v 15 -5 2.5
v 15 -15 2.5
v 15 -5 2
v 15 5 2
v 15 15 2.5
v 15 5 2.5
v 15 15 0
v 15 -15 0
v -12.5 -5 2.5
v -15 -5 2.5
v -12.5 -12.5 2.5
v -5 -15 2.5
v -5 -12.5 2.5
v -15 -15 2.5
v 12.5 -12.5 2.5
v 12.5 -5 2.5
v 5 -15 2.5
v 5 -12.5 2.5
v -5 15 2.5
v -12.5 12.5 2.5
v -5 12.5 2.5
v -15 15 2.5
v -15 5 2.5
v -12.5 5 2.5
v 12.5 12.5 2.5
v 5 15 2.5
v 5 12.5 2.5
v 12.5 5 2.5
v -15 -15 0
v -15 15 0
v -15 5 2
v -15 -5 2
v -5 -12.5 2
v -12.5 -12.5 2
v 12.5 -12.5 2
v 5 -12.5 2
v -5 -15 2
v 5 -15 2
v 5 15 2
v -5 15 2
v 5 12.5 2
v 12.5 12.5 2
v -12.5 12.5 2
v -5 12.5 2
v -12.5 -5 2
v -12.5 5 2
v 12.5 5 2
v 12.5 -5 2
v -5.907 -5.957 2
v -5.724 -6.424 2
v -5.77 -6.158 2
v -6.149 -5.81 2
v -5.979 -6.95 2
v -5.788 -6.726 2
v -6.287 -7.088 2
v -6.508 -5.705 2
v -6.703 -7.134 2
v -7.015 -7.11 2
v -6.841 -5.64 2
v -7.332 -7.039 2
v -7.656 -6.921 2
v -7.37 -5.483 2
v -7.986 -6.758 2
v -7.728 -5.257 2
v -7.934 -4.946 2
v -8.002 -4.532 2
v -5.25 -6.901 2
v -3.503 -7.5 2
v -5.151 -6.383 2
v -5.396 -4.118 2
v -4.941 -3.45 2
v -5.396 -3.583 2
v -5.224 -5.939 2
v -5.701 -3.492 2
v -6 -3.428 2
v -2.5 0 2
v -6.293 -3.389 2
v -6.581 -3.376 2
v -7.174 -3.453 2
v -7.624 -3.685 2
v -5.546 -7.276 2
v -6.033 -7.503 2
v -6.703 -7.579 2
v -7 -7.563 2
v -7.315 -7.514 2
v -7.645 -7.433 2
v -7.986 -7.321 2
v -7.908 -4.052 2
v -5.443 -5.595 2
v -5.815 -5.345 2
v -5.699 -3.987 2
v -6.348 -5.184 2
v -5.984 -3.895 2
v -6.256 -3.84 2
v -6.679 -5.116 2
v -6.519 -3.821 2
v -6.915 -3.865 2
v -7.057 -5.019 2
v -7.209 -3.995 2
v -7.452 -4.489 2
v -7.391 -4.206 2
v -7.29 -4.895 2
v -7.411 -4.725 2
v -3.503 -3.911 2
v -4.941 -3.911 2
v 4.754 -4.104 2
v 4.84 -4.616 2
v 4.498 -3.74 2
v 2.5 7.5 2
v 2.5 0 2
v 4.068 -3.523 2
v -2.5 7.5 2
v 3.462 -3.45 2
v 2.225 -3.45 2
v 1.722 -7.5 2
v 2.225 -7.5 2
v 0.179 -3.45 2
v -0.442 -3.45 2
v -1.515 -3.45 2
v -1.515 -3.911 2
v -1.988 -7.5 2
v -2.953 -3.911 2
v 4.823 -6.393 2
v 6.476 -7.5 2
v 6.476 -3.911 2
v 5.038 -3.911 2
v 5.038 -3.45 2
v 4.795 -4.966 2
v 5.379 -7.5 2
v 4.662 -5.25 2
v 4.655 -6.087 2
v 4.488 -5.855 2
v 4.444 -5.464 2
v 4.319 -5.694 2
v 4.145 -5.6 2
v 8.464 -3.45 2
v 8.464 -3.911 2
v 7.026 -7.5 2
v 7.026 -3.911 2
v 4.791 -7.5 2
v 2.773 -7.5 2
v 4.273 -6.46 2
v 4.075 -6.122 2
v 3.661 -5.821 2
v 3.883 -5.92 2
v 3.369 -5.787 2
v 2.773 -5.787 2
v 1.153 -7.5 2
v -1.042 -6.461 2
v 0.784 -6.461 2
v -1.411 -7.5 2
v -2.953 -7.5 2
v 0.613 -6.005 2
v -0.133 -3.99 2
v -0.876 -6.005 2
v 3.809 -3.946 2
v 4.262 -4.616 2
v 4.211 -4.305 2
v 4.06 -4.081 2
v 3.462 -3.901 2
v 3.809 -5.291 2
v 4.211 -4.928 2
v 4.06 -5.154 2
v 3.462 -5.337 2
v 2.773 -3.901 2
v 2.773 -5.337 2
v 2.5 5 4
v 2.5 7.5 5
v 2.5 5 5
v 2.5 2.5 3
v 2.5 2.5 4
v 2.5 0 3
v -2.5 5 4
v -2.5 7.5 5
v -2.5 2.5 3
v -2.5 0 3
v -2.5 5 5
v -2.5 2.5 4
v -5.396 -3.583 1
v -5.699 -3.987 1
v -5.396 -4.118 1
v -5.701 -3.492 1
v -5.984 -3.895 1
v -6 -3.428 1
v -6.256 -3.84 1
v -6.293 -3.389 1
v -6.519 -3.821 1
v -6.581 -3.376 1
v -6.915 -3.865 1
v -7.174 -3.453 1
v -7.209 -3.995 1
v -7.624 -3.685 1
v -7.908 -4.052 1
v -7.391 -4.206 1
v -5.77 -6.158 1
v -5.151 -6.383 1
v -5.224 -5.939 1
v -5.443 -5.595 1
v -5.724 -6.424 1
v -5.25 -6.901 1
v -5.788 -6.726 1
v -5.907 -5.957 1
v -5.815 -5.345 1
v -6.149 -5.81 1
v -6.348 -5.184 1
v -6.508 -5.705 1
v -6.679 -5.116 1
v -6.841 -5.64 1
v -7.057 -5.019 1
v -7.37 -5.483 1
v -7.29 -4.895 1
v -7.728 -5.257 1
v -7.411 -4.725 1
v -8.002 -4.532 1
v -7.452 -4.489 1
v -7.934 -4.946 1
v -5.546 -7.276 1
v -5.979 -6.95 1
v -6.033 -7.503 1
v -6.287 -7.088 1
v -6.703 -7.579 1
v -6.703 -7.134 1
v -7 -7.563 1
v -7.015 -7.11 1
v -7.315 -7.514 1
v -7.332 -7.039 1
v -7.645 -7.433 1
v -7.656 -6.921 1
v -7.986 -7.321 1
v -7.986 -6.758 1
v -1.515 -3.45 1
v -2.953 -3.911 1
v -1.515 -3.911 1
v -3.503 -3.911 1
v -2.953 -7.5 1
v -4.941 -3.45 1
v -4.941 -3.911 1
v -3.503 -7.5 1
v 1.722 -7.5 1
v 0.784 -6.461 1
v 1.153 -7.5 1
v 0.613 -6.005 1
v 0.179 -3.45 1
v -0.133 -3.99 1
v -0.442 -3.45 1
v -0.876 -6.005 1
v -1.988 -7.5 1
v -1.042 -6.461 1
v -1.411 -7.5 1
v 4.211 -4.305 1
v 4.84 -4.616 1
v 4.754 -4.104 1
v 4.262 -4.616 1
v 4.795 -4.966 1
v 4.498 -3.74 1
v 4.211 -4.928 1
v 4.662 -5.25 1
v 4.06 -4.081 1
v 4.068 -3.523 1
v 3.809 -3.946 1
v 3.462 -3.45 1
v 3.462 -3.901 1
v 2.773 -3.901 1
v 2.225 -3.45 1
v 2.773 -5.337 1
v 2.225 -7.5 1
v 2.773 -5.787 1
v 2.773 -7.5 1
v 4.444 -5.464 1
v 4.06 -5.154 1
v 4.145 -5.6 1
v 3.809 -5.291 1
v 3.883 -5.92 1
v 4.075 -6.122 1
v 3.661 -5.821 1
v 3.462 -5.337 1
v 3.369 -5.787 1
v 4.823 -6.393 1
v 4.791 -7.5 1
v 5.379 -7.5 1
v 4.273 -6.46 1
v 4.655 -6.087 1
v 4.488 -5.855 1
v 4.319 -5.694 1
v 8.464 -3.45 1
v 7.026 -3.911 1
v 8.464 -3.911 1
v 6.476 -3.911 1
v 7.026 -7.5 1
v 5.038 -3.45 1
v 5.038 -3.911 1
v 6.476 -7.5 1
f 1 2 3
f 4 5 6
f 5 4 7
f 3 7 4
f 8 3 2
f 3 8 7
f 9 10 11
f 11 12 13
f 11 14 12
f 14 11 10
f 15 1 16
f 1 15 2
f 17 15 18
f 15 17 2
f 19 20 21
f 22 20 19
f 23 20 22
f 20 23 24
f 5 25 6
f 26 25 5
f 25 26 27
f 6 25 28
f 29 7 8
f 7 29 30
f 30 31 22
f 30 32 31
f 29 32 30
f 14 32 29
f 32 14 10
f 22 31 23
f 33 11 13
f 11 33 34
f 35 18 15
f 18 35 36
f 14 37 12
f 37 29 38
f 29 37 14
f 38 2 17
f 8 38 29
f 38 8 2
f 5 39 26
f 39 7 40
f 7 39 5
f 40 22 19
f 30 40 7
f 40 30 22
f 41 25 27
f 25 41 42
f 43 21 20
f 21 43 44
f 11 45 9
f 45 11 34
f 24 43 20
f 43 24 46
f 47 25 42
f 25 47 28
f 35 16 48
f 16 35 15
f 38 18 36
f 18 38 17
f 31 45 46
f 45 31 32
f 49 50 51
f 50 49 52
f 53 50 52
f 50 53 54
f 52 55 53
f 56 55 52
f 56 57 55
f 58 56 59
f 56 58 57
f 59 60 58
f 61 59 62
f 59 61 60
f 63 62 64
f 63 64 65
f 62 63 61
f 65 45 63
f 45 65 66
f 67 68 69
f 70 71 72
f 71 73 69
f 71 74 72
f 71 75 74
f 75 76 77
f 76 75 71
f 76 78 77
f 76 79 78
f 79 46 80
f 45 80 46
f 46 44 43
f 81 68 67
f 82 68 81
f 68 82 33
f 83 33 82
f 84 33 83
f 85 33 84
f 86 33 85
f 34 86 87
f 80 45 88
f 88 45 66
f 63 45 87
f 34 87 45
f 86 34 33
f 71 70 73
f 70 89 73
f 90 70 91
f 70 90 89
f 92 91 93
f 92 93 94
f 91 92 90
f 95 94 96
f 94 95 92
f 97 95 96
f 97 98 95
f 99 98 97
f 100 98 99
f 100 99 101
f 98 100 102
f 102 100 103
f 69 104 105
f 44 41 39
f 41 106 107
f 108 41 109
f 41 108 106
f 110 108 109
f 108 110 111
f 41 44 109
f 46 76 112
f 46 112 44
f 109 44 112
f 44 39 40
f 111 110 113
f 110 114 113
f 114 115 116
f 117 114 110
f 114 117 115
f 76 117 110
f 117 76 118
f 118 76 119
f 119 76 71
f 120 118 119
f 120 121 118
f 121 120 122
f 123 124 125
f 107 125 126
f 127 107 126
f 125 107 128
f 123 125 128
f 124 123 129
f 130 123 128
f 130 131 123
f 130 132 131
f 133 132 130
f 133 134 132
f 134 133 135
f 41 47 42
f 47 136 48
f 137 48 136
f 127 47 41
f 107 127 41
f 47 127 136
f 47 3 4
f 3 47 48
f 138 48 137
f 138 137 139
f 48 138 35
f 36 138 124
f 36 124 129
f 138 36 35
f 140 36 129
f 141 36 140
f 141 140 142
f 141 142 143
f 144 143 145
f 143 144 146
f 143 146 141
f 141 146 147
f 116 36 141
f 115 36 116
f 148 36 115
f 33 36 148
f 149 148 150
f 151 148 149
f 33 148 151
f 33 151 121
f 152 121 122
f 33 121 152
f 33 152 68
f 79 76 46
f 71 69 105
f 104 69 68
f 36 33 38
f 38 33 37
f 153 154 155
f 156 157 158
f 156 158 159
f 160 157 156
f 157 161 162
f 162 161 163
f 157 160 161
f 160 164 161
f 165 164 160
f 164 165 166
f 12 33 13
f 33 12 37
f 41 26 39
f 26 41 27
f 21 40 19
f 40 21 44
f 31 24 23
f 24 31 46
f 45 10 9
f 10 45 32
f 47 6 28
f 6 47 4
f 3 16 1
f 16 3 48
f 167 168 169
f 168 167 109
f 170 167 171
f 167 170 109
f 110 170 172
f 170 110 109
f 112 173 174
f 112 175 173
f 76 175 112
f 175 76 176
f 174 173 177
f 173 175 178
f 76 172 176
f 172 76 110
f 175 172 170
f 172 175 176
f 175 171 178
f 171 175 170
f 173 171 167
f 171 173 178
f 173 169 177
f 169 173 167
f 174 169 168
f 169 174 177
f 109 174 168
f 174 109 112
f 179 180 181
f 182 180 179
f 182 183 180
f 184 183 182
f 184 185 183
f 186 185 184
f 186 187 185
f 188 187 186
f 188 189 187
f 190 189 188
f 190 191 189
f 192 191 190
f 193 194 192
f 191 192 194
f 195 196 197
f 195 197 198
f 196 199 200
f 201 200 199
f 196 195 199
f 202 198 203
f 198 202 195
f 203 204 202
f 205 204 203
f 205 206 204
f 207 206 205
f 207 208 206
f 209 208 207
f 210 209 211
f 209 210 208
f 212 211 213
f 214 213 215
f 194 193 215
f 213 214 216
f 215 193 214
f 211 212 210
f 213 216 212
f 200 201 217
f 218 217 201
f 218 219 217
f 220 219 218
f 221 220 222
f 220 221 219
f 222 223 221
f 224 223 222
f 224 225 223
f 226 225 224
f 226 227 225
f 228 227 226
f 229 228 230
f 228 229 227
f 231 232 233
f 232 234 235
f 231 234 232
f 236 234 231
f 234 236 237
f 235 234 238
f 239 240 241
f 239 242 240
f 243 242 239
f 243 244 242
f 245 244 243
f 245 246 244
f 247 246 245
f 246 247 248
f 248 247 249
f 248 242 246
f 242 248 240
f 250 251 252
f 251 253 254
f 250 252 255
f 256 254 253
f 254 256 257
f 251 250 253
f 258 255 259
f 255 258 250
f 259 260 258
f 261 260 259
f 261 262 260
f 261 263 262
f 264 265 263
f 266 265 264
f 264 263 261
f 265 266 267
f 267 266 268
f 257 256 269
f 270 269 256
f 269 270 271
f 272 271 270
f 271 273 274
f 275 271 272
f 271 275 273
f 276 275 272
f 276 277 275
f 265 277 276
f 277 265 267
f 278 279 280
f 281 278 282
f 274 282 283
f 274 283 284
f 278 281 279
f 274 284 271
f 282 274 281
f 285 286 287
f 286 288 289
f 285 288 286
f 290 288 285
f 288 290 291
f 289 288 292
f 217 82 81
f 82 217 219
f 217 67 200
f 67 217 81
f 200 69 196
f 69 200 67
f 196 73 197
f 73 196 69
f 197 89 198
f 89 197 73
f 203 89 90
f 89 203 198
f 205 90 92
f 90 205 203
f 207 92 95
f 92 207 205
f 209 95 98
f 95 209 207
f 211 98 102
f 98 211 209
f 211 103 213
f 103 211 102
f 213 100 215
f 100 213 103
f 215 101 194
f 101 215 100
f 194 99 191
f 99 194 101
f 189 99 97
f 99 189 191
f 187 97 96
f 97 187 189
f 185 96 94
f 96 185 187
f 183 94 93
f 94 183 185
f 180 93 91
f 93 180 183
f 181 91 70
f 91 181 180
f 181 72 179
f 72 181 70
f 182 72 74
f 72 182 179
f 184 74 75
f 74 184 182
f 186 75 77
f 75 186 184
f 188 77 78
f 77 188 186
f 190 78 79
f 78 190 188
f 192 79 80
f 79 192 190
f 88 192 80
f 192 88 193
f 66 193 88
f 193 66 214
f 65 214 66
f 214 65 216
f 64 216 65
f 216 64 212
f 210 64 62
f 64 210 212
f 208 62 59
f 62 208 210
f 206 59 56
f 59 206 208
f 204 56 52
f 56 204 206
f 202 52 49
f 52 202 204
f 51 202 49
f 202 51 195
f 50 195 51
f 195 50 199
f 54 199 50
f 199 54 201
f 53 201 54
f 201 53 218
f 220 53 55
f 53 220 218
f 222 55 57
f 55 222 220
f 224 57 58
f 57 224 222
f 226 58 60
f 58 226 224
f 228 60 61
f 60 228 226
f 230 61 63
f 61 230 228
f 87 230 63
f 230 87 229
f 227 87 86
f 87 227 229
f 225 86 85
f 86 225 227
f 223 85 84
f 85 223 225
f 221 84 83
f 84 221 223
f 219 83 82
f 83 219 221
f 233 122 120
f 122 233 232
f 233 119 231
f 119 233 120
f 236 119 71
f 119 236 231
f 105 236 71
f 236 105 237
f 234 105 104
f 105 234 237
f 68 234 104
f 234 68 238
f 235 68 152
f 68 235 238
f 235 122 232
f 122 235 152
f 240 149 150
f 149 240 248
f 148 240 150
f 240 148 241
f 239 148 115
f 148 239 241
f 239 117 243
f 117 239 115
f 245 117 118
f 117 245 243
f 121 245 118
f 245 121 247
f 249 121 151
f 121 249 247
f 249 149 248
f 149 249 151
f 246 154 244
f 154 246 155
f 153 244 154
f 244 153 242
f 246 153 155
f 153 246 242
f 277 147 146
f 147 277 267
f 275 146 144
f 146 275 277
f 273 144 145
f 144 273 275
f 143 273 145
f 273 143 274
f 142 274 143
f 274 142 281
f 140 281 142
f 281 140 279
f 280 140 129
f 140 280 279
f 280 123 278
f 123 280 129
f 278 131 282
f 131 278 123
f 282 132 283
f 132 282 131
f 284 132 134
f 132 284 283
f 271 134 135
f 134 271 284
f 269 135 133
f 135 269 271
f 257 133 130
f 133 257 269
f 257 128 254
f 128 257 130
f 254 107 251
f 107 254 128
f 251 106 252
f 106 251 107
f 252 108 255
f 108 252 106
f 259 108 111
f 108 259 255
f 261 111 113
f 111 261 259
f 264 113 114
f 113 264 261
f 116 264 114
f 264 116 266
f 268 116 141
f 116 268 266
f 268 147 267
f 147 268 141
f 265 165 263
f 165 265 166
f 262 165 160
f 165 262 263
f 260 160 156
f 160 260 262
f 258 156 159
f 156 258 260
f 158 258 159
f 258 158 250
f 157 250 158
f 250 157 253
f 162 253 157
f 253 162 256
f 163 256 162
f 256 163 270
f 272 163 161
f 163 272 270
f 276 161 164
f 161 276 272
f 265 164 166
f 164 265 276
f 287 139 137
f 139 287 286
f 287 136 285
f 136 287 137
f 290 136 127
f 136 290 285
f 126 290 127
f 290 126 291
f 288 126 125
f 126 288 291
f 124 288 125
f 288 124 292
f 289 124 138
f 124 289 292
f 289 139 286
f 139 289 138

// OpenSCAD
//Text configuration. Leave  blank to not have any text.
start_text = "START";
//Font selection. Uses the included google fonts.
start_font = "Libre Baskerville";
//Text size. Scale this with your model.
text_size = 4;
//Is the left side an open door instead of a wall?
left_door = 1; // [0:false, 1:true]
//Is the right side an open door instead of a wall?
right_door = 1; // [0:false, 1:true]
//Is the top an open door instead of a wall?
top_door = 1; // [0:false, 1:true]
//Is the bottom an open door instead of a wall?
bottom_door = 1; // [0:false, 1:true]
//Are there stairs in the center of the tile?
stairs = 1; // [0:false, 1:true]
//Sometimes the stairs get a little big on small tiles. Change this to false if you want less stairs. If you're seeing the wrong number of stairs, try increasing your wall thickness- they're linked.
there_are_four_steps = 1; // [0:false, 1:true]
//The base size of the tile, in millimeters.
size = 30;
//Total size of the blocks used for the walls. If you want walls, keep this higher than thickness.
wall = 2.5;
//The thickness of the tile. Since the tile partially covers walls and stairs, make sure to resize them to match.
thickness = 2;

module base() {
    translate([-(size/2),-(size/2),0]) {
        cube([size,size,thickness]);
    }
}

module walls() {
    difference() {
        union() {
            translate([-(size/2),-(size/2),0]) {
                cube([size,wall,wall]);
            }
            translate([-(size/2),(size/2)-wall,0]) {
                cube([size,wall,wall]);
            }
            translate([-(size/2),-(size/2),0]) {
                cube([wall,size,wall]);
            }
            translate([(size/2)-wall,-(size/2),0]) {
                cube([wall,size,wall]);
            }
        }
        if (bottom_door) {
            translate([-size/6,-size/2-1,2]) {
                cube([(size/3),(size/3),wall]);
            }
        }
        if (top_door) {
            translate([-size/6,size/6+1,2]) {
                cube([(size/3),(size/3),wall]);
            }
        }
        if (left_door) {
            translate([-size/2,-size/6,2]) {
                cube([(size/3),(size/3),wall]);
            }
        }
        if (right_door) {
            translate([size/6,-size/6,2]) {
                cube([(size/3),(size/3),wall]);
            }
        }
    }
    
}

module stairs() {
    translate([-wall,-wall,(wall * 2/5)]) {
        cube([wall*2,wall,(wall * 2/5)]);
    }
    translate([-wall,0,(wall * 2/5)]) {
        cube([wall*2,wall,(wall * 4/5)]);
    }
    translate([-wall,wall,(wall * 2/5)]) {
        cube([wall*2,wall,(wall * 6/5)]);
    }
    if (there_are_four_steps) {
        translate([-wall,2*wall,(wall * 2/5)]) {
            cube([wall*2,wall,(wall * 8/5)]);
        }
    }
}

module start() {
    translate ([0,-size/4,thickness-1]) {
        linear_extrude(height=1) {
            text(start_text, font=start_font, size=text_size, halign="center");
        }
    }    
}

module main() {
    difference() {
        union() {
            walls();
            base();
            if (stairs) {
                stairs();
            }
        }
        start();
    }
}

main();
